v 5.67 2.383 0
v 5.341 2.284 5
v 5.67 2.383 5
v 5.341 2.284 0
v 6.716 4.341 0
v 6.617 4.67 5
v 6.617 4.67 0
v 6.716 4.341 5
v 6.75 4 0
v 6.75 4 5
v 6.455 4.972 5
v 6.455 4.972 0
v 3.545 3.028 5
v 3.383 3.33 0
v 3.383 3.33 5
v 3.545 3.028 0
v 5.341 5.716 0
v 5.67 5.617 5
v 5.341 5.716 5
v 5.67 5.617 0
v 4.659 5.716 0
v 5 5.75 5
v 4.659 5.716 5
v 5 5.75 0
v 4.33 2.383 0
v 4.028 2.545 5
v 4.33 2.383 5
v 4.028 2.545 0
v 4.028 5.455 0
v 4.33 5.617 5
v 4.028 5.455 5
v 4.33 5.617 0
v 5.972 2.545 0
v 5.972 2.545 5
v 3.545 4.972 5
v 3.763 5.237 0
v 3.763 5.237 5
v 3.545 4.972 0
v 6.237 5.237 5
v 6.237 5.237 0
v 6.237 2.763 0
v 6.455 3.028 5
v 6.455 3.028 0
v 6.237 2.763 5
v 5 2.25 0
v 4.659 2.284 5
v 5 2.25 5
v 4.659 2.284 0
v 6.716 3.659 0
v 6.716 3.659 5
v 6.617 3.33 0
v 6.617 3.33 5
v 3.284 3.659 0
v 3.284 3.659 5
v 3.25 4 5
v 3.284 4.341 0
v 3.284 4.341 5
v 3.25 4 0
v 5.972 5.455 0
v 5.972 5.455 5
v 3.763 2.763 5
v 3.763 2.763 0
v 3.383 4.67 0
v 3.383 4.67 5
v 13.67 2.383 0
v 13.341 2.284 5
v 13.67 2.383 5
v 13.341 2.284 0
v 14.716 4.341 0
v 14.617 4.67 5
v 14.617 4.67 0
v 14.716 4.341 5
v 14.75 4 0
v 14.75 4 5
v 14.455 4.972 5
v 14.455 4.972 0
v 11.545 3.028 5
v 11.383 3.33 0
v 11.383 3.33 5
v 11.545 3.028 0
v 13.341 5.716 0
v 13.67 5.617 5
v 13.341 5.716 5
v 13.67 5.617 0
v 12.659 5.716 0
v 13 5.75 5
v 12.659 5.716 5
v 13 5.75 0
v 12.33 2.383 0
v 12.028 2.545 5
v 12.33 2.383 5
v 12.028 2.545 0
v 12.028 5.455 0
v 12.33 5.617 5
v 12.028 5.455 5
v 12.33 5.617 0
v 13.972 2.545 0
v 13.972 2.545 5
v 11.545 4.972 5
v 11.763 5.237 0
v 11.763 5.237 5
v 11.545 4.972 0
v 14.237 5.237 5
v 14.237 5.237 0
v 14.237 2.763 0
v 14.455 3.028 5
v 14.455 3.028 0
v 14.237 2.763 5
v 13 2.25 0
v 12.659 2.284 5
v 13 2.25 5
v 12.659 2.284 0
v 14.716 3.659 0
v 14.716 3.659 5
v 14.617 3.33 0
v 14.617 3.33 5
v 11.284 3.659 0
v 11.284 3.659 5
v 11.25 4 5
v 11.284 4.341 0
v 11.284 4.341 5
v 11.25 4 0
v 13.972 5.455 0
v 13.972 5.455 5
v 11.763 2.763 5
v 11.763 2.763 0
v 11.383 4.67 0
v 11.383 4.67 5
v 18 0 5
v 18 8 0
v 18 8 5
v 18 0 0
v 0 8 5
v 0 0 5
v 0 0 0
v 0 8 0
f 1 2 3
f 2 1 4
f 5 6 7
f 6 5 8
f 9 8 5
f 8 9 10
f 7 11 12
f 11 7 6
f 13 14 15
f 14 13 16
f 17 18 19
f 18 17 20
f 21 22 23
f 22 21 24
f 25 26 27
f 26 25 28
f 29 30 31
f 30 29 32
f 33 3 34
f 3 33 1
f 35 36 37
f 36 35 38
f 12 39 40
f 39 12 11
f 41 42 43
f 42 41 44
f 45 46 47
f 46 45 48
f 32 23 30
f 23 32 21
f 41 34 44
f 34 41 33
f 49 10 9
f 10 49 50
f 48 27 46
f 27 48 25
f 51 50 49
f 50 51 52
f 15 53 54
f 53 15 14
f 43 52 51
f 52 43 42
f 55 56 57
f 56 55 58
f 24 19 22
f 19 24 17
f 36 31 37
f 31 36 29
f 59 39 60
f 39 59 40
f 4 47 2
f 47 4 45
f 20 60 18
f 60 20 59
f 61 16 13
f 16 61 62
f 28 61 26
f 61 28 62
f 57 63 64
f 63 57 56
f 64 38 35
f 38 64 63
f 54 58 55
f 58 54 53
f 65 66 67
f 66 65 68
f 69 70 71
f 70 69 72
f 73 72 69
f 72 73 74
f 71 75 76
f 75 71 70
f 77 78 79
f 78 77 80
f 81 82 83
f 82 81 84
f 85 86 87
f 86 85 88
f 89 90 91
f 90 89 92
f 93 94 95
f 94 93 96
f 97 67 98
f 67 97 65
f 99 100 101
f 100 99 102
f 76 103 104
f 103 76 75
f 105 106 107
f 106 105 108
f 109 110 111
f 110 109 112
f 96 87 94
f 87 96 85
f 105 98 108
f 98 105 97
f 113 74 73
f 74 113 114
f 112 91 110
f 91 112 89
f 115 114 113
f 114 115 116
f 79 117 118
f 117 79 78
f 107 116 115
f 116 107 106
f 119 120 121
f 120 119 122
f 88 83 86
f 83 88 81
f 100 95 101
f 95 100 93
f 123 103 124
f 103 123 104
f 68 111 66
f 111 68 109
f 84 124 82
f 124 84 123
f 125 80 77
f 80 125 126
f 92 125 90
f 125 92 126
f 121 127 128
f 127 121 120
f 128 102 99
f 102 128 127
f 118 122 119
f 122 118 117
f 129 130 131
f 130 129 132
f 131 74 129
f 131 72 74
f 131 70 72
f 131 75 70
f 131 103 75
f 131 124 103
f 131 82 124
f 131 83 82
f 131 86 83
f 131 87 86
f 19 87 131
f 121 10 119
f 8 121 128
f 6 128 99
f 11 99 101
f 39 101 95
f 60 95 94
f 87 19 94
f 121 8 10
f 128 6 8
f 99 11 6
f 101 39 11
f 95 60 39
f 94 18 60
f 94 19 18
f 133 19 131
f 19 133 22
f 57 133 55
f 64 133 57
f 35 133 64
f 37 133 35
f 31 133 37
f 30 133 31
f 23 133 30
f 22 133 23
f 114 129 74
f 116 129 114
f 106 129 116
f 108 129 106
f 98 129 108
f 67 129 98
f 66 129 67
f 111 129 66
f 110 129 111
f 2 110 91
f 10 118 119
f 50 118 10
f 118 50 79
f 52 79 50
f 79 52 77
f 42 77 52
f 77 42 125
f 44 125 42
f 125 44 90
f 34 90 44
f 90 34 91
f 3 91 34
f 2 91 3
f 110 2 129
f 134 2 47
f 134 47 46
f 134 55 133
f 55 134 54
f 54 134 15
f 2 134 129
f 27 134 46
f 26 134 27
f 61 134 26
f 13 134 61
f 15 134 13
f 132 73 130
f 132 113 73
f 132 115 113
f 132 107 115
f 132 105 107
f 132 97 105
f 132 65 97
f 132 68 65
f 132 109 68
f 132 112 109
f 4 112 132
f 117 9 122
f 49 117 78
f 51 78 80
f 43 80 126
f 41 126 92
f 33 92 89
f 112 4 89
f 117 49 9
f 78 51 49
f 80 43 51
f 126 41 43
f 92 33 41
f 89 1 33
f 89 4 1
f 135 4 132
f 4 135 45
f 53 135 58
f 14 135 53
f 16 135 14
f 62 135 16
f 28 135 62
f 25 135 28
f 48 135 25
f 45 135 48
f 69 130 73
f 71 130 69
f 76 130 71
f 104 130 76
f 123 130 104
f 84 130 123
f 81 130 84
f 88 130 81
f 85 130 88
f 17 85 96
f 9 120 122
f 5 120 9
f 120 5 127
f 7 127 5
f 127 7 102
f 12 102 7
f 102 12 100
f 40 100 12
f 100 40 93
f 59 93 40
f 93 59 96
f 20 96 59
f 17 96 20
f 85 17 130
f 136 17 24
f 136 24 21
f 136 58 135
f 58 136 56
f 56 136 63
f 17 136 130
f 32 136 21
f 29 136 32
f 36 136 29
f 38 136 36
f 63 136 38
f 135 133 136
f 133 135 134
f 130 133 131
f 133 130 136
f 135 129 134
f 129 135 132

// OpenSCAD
$fn = 32;

// ----------------------------------------------------------------------
// Micro pad: two-hole pad, 5-20 mm class
// ----------------------------------------------------------------------

// --- parameters (mm) ---
pad_l = 18;               // pad length, X
pad_w = 8;                // pad width, Y
pad_t = 5;                // pad thickness, Z
hole_d = 3.5;             // hole diameter
hole_x = 5;               // X of the first hole centre

difference() {
  cube([pad_l, pad_w, pad_t]);
  for (x = [hole_x, pad_l - hole_x])
    translate([x, pad_w / 2, -1])
      cylinder(h = pad_t + 2, d = hole_d);
}
